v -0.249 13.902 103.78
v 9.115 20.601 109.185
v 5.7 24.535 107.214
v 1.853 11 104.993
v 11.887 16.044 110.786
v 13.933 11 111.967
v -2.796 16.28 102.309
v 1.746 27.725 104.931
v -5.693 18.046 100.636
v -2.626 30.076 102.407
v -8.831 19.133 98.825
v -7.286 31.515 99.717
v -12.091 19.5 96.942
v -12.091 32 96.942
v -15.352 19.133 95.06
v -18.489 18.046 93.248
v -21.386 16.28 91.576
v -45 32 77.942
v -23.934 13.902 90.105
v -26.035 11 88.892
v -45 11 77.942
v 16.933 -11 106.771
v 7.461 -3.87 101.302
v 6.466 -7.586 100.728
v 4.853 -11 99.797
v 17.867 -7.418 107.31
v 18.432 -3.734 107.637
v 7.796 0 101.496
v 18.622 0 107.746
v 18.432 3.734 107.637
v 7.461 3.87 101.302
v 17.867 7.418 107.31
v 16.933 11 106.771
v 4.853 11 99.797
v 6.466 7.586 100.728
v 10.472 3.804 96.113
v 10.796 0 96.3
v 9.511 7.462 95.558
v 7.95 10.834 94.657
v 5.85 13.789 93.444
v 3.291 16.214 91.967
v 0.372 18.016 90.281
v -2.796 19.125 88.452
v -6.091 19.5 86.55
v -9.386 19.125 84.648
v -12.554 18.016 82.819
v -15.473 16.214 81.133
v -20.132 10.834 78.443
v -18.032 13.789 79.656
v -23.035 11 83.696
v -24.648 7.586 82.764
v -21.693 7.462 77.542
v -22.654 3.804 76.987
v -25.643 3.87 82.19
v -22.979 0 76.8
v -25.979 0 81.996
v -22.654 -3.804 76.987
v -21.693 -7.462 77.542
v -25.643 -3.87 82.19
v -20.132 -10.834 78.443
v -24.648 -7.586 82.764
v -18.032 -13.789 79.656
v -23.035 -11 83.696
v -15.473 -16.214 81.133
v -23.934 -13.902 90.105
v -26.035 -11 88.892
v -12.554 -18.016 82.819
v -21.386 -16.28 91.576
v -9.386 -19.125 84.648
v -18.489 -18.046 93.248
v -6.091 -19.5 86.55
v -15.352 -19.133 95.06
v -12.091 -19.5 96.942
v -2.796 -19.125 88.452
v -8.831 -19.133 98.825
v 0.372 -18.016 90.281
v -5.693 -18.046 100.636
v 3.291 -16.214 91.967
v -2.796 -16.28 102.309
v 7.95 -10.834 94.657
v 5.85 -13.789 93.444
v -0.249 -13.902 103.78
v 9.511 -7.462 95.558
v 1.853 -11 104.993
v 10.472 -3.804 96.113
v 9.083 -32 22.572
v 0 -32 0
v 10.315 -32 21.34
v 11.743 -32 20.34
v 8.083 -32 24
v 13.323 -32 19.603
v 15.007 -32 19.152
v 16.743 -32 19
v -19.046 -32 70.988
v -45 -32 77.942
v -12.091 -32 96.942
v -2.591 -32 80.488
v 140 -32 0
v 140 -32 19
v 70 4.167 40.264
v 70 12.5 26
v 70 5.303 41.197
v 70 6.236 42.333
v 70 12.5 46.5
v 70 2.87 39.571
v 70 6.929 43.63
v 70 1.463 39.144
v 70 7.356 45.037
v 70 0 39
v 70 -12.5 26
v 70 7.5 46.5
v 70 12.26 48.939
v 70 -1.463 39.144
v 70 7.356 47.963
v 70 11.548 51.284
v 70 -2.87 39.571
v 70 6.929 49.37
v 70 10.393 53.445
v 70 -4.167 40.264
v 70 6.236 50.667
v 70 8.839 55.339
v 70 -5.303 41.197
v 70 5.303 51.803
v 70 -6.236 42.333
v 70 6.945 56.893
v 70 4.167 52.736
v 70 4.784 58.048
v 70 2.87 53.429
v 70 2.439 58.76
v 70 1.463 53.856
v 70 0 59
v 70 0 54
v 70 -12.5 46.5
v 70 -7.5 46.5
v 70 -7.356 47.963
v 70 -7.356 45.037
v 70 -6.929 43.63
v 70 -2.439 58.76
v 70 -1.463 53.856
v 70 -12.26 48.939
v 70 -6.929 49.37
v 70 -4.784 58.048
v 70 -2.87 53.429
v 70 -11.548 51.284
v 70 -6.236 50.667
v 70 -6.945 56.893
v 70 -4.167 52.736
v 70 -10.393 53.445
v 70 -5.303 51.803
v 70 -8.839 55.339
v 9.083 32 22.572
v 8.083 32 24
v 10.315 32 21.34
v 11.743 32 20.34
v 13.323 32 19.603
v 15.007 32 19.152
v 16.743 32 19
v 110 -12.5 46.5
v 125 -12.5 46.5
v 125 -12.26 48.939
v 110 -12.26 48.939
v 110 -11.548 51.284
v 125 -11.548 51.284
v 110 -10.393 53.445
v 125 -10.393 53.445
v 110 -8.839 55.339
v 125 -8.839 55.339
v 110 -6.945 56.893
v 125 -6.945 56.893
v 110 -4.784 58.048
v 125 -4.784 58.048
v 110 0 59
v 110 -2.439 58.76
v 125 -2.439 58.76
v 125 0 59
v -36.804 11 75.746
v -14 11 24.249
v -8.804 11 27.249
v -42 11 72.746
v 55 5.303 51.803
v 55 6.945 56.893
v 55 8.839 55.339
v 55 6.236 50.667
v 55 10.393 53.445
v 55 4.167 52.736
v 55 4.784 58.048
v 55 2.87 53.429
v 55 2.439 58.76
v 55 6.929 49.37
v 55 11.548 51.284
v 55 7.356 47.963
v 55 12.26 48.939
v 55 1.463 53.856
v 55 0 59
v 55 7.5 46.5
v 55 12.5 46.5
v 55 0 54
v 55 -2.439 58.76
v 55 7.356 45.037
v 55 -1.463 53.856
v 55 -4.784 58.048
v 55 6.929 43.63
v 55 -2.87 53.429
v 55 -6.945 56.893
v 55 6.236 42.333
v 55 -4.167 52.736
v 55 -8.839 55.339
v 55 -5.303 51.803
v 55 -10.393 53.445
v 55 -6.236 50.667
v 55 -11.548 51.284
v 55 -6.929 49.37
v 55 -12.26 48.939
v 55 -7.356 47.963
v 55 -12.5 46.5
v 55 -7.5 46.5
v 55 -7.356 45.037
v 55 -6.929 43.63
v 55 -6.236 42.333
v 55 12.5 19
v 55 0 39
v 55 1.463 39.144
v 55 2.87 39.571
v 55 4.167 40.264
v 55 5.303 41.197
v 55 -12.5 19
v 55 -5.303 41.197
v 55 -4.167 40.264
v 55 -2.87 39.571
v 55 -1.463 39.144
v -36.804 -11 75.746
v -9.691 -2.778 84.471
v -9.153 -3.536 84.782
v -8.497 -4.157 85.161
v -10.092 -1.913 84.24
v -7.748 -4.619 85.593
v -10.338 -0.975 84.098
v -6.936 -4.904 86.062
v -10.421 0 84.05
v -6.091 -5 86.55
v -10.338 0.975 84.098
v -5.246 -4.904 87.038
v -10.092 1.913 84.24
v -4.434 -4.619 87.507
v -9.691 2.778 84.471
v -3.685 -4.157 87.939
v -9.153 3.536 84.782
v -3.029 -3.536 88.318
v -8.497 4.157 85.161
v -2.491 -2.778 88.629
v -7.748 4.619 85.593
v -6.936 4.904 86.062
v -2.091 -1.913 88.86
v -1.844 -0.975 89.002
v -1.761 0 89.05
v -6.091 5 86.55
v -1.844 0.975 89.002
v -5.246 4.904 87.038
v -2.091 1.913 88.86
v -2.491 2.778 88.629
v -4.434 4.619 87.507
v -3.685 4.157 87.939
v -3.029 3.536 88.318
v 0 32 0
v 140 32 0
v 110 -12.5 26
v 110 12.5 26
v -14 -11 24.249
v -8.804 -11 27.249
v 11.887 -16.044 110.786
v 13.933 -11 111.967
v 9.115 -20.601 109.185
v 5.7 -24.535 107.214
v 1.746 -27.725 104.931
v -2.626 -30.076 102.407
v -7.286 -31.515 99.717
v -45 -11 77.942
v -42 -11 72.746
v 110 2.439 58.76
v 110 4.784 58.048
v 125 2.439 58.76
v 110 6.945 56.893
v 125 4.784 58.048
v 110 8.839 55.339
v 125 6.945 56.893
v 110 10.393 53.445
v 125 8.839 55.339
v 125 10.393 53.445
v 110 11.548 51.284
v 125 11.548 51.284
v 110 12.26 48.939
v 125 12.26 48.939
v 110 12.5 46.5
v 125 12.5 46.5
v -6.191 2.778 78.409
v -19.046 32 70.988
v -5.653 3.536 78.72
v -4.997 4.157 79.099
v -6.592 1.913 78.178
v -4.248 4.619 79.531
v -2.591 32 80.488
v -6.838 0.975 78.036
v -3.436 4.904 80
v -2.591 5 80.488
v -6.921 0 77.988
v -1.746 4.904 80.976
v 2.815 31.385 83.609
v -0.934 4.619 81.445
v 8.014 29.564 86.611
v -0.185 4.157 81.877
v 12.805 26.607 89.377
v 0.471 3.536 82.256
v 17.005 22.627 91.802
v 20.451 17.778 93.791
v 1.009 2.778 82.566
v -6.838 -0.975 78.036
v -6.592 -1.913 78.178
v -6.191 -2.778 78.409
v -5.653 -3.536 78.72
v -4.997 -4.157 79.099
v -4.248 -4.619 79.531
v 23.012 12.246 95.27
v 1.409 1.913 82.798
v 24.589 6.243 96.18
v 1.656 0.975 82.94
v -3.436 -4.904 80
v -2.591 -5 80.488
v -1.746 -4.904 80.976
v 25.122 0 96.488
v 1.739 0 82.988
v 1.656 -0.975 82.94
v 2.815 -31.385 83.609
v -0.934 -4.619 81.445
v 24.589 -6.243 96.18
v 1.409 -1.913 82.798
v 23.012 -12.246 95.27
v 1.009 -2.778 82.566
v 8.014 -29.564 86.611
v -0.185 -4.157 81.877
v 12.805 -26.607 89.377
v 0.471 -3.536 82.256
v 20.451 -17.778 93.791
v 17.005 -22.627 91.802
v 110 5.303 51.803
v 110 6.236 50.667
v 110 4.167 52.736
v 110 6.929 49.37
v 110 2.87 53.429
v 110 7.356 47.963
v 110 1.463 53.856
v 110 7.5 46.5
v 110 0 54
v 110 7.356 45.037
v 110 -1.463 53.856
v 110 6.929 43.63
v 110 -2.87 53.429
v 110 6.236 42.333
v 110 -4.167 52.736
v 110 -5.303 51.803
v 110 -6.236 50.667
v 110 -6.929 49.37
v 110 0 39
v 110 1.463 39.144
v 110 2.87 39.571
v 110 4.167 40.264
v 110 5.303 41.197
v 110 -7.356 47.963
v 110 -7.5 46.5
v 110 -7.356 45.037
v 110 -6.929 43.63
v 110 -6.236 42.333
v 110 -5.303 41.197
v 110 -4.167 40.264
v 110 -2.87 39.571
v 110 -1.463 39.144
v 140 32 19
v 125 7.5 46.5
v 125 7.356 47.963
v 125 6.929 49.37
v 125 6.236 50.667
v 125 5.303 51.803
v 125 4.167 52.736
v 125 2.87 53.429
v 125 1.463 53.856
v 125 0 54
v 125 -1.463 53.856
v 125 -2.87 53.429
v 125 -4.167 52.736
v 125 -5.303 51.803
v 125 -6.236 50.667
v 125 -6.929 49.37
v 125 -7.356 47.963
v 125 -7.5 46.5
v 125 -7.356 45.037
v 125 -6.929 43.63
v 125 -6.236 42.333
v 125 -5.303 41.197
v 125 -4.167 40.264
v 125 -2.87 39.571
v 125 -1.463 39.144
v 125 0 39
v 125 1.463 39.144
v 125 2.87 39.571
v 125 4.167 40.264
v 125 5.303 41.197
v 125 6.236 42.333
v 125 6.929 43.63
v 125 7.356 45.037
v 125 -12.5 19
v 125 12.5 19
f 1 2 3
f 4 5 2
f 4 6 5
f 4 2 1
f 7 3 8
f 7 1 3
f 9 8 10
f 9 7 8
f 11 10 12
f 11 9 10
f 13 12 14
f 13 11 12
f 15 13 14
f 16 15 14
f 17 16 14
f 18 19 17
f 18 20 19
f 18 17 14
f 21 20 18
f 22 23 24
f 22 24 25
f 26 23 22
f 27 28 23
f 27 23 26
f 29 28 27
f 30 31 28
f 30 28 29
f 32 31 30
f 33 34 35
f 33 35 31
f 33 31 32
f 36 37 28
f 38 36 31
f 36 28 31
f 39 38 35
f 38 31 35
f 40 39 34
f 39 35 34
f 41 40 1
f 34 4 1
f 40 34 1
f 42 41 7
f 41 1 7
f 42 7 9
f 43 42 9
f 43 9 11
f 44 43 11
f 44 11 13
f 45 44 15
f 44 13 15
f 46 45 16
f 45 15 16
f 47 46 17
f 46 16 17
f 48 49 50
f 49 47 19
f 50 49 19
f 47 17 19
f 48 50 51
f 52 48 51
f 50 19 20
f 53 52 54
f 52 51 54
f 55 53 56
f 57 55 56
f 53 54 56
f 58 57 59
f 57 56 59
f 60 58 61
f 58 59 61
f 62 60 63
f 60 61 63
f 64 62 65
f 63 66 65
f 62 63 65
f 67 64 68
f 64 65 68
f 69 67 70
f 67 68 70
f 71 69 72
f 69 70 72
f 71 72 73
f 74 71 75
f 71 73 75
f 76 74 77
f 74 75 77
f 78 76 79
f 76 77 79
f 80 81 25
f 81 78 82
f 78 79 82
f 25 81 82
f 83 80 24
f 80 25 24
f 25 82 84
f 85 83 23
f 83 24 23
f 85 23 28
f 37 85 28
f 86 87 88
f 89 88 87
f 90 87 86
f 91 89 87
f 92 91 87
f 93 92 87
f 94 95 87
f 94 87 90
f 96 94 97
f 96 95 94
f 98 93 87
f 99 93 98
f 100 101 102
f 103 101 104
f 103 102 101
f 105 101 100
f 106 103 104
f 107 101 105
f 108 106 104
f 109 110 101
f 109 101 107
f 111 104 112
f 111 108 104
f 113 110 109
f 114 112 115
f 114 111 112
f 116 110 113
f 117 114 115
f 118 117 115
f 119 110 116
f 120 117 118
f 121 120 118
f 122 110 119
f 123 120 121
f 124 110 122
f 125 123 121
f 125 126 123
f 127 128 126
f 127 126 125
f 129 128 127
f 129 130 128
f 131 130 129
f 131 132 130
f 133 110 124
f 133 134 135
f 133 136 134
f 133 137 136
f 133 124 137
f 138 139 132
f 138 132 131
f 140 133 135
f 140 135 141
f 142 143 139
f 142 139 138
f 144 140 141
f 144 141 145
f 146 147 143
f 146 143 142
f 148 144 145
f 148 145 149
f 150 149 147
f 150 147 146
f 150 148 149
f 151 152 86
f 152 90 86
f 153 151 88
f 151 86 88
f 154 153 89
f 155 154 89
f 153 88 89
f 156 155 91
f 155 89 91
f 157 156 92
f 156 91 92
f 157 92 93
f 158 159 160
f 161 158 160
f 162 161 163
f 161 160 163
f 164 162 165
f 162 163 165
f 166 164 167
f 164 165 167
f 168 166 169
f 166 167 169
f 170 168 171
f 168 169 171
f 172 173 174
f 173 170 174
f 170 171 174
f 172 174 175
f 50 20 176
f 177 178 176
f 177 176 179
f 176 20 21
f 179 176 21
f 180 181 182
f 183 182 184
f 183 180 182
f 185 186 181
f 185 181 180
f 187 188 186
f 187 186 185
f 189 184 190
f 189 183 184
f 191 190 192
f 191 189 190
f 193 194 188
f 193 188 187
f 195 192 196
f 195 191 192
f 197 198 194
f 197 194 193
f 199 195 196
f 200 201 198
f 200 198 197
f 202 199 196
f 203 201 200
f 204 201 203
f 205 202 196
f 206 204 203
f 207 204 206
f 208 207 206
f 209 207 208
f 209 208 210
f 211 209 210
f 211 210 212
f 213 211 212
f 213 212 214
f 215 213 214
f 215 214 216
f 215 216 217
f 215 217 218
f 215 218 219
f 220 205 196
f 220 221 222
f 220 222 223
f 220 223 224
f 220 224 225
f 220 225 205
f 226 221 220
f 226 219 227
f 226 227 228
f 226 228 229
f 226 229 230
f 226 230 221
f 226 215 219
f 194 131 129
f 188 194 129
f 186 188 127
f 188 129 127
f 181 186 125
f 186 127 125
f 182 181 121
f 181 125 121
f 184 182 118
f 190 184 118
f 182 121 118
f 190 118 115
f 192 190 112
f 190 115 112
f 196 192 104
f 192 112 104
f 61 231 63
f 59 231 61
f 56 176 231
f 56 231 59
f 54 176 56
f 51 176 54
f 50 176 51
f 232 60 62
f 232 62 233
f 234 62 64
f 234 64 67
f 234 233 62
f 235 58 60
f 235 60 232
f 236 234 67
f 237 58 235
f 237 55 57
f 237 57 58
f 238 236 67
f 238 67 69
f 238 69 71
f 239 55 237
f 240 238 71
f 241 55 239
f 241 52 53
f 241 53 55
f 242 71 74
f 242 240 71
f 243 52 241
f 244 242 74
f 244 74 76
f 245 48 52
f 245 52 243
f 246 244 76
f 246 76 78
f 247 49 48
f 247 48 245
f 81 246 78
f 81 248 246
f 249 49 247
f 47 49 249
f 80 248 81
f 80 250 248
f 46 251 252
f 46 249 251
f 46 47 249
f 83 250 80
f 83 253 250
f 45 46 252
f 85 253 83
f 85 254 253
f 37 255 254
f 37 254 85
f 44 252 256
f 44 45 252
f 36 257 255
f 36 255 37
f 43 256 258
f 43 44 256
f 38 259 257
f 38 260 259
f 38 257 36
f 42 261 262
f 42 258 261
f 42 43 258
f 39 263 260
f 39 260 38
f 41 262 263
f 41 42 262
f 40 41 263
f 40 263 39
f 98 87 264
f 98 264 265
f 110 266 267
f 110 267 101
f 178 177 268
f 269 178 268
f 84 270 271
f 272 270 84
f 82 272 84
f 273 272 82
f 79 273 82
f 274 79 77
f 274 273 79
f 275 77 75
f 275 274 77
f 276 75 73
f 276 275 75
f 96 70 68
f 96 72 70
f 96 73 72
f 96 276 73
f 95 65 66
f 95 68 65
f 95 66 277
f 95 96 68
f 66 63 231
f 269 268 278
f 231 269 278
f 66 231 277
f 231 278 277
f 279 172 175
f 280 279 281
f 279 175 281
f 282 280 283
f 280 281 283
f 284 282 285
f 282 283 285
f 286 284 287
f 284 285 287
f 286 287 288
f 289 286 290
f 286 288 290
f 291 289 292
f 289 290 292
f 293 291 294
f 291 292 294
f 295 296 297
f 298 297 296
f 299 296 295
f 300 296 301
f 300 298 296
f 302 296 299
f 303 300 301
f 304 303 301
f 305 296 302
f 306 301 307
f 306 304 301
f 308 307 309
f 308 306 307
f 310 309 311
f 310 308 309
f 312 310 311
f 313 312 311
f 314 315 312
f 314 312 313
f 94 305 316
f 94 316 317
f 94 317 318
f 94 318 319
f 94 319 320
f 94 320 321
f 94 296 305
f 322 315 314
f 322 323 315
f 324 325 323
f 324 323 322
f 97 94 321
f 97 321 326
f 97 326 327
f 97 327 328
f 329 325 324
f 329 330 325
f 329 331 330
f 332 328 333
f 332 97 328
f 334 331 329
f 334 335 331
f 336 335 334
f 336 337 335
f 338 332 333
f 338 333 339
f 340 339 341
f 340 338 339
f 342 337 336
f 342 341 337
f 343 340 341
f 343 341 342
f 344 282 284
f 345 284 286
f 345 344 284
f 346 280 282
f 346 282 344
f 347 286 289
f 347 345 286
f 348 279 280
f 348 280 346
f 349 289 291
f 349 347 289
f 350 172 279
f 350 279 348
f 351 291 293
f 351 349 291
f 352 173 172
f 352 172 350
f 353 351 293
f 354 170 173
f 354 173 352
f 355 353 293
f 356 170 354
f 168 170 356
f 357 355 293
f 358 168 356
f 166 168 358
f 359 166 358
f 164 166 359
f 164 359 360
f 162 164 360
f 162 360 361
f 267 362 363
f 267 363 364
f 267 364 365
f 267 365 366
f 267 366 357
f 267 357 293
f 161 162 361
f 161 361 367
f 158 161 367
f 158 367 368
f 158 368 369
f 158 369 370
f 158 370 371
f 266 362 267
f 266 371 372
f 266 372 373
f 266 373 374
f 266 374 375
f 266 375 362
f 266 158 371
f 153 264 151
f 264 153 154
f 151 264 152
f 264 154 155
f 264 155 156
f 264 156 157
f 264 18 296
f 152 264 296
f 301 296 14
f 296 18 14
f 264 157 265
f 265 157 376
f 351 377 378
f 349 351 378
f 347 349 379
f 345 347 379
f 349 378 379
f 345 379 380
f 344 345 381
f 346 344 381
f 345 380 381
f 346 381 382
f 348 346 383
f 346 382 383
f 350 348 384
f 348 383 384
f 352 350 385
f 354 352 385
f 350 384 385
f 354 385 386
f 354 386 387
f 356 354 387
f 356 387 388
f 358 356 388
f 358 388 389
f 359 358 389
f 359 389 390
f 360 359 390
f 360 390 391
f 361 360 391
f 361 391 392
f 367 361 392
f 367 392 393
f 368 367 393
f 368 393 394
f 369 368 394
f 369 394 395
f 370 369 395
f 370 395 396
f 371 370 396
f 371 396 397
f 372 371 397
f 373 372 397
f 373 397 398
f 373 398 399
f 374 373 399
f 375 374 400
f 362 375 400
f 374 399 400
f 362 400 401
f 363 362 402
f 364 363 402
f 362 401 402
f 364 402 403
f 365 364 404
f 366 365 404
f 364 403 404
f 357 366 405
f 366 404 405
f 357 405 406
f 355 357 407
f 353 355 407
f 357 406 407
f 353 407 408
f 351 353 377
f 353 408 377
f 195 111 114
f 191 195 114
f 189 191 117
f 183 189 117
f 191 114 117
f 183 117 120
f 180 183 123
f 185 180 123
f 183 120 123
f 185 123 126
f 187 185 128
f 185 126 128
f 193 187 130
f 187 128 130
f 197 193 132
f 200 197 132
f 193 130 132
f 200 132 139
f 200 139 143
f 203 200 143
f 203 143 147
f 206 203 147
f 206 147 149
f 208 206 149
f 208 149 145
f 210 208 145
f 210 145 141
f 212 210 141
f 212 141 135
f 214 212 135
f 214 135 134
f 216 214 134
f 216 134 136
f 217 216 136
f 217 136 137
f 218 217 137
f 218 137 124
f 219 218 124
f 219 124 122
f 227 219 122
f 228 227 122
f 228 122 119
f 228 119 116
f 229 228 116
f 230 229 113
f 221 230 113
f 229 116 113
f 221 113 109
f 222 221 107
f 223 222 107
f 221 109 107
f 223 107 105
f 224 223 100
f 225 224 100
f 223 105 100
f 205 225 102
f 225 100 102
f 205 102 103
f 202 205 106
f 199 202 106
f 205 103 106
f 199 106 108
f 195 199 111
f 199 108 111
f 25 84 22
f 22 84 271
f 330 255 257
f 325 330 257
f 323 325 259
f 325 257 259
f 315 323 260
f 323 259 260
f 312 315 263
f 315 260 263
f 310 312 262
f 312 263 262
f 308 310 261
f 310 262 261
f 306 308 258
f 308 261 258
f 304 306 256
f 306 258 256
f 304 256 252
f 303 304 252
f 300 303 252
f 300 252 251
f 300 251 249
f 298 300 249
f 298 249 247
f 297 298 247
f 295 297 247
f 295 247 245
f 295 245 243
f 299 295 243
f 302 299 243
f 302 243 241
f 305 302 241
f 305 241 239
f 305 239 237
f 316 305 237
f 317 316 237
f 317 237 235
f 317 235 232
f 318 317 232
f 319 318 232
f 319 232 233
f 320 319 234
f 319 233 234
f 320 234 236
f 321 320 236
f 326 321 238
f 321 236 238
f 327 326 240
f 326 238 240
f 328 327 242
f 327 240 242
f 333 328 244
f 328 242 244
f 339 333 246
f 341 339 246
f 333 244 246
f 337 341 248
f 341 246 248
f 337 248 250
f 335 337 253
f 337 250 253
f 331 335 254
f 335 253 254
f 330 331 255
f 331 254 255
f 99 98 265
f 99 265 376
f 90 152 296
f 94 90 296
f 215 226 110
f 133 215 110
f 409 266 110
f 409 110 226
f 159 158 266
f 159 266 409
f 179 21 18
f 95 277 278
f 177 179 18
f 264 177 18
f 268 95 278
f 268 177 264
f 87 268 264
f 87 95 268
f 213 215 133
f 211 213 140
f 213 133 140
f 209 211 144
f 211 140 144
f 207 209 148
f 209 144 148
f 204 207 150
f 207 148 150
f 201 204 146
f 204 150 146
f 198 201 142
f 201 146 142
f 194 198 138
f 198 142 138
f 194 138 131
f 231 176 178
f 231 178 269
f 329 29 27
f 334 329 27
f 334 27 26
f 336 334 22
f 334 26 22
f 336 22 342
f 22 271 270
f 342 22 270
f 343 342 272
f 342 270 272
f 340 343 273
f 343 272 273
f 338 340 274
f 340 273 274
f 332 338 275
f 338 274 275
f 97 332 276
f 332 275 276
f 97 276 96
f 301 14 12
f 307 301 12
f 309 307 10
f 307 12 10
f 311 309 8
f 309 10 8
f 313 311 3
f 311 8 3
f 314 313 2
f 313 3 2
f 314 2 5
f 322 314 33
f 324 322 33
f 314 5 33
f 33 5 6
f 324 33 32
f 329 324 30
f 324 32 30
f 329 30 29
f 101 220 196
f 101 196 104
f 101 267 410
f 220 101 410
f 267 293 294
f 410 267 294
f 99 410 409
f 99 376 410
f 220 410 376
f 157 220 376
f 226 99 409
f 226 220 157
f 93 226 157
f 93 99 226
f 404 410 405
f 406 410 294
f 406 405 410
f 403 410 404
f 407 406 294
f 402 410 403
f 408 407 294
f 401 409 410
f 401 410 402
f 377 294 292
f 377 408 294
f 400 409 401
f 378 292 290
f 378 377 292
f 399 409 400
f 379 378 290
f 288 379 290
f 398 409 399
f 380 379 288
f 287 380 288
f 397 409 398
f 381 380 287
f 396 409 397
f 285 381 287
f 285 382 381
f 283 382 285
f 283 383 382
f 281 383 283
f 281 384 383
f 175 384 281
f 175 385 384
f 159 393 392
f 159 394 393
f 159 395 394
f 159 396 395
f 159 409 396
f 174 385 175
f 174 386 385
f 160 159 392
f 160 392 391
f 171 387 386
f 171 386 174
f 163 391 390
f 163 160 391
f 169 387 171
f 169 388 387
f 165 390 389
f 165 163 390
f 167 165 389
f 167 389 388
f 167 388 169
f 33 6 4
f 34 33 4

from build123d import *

# Parameters (mm, degrees)
F1_DEPTH  = 32
F2_DEPTH  = 12.5
F4_DEPTH  = 19
F5_R      = 10
F6_R      = 5
F7_DEPTH  = 19
F6_R_2    = 19.5
F8_DEPTH  = 12
F10_DEPTH = 6
F11_W     = 22
F11_H     = 56
F12_DEPTH = 6
F14_DEPTH = 70
F15_R     = 7.5
F16_DEPTH = 70


with BuildPart() as f1:
    # F0 (on Front) → F1 (new body, symmetric)
    with BuildSketch(Plane.XZ):
        Polygon((-45, 77.9422863406), (0, 0), (140, 0), (140, 19), (125, 19), (55, 19), (10.9696551146, 19), (-19.0455173281, 70.9878036687), (25.1217782649, 96.4878036687), (15.6217782649, 112.9422863406), align=None)
    extrude(amount=F1_DEPTH, both=True)

    # F0 (on Front) → F2 (join, symmetric)
    with BuildSketch(Plane.XZ):
        Polygon((55, 19), (125, 19), (125, 59), (110, 59), (110, 26), (70, 26), (70, 59), (55, 59), align=None)
    extrude(amount=F2_DEPTH, both=True)

    # F3 (on face) → F4 (cut, through all)
    with BuildSketch(Plane(origin=(-45, 0, 77.9422863406), x_dir=(0.8660254038, 0, 0.5), z_dir=(-0.5, 0, 0.8660254038))):
        with BuildLine():
            ThreePointArc((38, 32), (60.627416998, 22.627416998), (70, 0))
            Line((70, 0), (70, 32))
            Line((70, 32), (38, 32))
        make_face()
        with BuildLine():
            Line((70, -32), (70, 0))
            ThreePointArc((70, 0), (60.627416998, -22.627416998), (38, -32))
            Line((38, -32), (70, -32))
        make_face()
    extrude(amount=-F4_DEPTH, mode=Mode.SUBTRACT)

    # F5
    f5_edges = [f1.edges().sort_by_distance(p)[0] for p in [
        (10.969655, 0, 19),
    ]]
    fillet(f5_edges, radius=F5_R)

    # F6 (on face) → F7 (cut, through all)
    with BuildSketch(Plane(origin=(-45, 0, 77.9422863406), x_dir=(0.8660254038, 0, 0.5), z_dir=(-0.5, 0, 0.8660254038))):
        with Locations((38, 0)):
            Circle(F6_R)
    extrude(amount=-F7_DEPTH, mode=Mode.SUBTRACT)

    # F6 (on face) → F8 (cut)
    with BuildSketch(Plane(origin=(-45, 0, 77.9422863406), x_dir=(0.8660254038, 0, 0.5), z_dir=(-0.5, 0, 0.8660254038))):
        with Locations((38, 0)):
            Circle(F6_R_2)
        with Locations((38, 0)):
            Circle(F6_R, mode=Mode.SUBTRACT)
    extrude(amount=-F8_DEPTH, mode=Mode.SUBTRACT)

    # F9 (on face) → F10 (cut)
    with BuildSketch(Plane(origin=(-45, 0, 77.9422863406), x_dir=(0.8660254038, 0, 0.5), z_dir=(-0.5, 0, 0.8660254038))):
        with BuildLine():
            Line((21.8987578119, 11), (0, 11))
            Line((0, 11), (0, -11))
            Line((0, -11), (21.8987578119, -11))
            ThreePointArc((21.8987578119, -11), (18.5, 0), (21.8987578119, 11))
        make_face()
        with BuildLine():
            Line((68.0499584026, 11), (54.1012421881, 11))
            ThreePointArc((54.1012421881, 11), (56.630944993, 5.7565518035), (57.5, 0))
            ThreePointArc((57.5, 0), (56.630944993, -5.7565518035), (54.1012421881, -11))
            Line((54.1012421881, -11), (68.0499584026, -11))
            ThreePointArc((68.0499584026, -11), (70, 0), (68.0499584026, 11))
        make_face()
    extrude(amount=-F10_DEPTH, mode=Mode.SUBTRACT)

    # F11 (on face) → F12 (cut)
    with BuildSketch(Plane(origin=(0, 0, 0), x_dir=(0, -1, 0), z_dir=(-0.8660254038, 0, -0.5))):
        with Locations((0, 56)):
            Rectangle(F11_W, F11_H)
    extrude(amount=-F12_DEPTH, mode=Mode.SUBTRACT)

    # F13 (on face) → F14 (cut, through all)
    with BuildSketch(Plane.YZ.offset(125)):
        with BuildLine():
            ThreePointArc((-12.5, 46.5), (-8.8388347372, 55.3388347924), (7.81e-08, 59))
            Line((7.81e-08, 59), (-12.5, 59))
            Line((-12.5, 59), (-12.5, 46.5))
        make_face()
        with BuildLine():
            ThreePointArc((7.81e-08, 59), (8.8388347924, 55.3388347372), (12.5, 46.5))
            Line((12.5, 46.5), (12.5, 59))
            Line((12.5, 59), (7.81e-08, 59))
        make_face()
    extrude(amount=-F14_DEPTH, mode=Mode.SUBTRACT)

    # F15 (on face) → F16 (cut, through all)
    with BuildSketch(Plane.YZ.offset(125)):
        with Locations((0, 46.5)):
            Circle(F15_R)
    extrude(amount=-F16_DEPTH, mode=Mode.SUBTRACT)


solid = f1.part
